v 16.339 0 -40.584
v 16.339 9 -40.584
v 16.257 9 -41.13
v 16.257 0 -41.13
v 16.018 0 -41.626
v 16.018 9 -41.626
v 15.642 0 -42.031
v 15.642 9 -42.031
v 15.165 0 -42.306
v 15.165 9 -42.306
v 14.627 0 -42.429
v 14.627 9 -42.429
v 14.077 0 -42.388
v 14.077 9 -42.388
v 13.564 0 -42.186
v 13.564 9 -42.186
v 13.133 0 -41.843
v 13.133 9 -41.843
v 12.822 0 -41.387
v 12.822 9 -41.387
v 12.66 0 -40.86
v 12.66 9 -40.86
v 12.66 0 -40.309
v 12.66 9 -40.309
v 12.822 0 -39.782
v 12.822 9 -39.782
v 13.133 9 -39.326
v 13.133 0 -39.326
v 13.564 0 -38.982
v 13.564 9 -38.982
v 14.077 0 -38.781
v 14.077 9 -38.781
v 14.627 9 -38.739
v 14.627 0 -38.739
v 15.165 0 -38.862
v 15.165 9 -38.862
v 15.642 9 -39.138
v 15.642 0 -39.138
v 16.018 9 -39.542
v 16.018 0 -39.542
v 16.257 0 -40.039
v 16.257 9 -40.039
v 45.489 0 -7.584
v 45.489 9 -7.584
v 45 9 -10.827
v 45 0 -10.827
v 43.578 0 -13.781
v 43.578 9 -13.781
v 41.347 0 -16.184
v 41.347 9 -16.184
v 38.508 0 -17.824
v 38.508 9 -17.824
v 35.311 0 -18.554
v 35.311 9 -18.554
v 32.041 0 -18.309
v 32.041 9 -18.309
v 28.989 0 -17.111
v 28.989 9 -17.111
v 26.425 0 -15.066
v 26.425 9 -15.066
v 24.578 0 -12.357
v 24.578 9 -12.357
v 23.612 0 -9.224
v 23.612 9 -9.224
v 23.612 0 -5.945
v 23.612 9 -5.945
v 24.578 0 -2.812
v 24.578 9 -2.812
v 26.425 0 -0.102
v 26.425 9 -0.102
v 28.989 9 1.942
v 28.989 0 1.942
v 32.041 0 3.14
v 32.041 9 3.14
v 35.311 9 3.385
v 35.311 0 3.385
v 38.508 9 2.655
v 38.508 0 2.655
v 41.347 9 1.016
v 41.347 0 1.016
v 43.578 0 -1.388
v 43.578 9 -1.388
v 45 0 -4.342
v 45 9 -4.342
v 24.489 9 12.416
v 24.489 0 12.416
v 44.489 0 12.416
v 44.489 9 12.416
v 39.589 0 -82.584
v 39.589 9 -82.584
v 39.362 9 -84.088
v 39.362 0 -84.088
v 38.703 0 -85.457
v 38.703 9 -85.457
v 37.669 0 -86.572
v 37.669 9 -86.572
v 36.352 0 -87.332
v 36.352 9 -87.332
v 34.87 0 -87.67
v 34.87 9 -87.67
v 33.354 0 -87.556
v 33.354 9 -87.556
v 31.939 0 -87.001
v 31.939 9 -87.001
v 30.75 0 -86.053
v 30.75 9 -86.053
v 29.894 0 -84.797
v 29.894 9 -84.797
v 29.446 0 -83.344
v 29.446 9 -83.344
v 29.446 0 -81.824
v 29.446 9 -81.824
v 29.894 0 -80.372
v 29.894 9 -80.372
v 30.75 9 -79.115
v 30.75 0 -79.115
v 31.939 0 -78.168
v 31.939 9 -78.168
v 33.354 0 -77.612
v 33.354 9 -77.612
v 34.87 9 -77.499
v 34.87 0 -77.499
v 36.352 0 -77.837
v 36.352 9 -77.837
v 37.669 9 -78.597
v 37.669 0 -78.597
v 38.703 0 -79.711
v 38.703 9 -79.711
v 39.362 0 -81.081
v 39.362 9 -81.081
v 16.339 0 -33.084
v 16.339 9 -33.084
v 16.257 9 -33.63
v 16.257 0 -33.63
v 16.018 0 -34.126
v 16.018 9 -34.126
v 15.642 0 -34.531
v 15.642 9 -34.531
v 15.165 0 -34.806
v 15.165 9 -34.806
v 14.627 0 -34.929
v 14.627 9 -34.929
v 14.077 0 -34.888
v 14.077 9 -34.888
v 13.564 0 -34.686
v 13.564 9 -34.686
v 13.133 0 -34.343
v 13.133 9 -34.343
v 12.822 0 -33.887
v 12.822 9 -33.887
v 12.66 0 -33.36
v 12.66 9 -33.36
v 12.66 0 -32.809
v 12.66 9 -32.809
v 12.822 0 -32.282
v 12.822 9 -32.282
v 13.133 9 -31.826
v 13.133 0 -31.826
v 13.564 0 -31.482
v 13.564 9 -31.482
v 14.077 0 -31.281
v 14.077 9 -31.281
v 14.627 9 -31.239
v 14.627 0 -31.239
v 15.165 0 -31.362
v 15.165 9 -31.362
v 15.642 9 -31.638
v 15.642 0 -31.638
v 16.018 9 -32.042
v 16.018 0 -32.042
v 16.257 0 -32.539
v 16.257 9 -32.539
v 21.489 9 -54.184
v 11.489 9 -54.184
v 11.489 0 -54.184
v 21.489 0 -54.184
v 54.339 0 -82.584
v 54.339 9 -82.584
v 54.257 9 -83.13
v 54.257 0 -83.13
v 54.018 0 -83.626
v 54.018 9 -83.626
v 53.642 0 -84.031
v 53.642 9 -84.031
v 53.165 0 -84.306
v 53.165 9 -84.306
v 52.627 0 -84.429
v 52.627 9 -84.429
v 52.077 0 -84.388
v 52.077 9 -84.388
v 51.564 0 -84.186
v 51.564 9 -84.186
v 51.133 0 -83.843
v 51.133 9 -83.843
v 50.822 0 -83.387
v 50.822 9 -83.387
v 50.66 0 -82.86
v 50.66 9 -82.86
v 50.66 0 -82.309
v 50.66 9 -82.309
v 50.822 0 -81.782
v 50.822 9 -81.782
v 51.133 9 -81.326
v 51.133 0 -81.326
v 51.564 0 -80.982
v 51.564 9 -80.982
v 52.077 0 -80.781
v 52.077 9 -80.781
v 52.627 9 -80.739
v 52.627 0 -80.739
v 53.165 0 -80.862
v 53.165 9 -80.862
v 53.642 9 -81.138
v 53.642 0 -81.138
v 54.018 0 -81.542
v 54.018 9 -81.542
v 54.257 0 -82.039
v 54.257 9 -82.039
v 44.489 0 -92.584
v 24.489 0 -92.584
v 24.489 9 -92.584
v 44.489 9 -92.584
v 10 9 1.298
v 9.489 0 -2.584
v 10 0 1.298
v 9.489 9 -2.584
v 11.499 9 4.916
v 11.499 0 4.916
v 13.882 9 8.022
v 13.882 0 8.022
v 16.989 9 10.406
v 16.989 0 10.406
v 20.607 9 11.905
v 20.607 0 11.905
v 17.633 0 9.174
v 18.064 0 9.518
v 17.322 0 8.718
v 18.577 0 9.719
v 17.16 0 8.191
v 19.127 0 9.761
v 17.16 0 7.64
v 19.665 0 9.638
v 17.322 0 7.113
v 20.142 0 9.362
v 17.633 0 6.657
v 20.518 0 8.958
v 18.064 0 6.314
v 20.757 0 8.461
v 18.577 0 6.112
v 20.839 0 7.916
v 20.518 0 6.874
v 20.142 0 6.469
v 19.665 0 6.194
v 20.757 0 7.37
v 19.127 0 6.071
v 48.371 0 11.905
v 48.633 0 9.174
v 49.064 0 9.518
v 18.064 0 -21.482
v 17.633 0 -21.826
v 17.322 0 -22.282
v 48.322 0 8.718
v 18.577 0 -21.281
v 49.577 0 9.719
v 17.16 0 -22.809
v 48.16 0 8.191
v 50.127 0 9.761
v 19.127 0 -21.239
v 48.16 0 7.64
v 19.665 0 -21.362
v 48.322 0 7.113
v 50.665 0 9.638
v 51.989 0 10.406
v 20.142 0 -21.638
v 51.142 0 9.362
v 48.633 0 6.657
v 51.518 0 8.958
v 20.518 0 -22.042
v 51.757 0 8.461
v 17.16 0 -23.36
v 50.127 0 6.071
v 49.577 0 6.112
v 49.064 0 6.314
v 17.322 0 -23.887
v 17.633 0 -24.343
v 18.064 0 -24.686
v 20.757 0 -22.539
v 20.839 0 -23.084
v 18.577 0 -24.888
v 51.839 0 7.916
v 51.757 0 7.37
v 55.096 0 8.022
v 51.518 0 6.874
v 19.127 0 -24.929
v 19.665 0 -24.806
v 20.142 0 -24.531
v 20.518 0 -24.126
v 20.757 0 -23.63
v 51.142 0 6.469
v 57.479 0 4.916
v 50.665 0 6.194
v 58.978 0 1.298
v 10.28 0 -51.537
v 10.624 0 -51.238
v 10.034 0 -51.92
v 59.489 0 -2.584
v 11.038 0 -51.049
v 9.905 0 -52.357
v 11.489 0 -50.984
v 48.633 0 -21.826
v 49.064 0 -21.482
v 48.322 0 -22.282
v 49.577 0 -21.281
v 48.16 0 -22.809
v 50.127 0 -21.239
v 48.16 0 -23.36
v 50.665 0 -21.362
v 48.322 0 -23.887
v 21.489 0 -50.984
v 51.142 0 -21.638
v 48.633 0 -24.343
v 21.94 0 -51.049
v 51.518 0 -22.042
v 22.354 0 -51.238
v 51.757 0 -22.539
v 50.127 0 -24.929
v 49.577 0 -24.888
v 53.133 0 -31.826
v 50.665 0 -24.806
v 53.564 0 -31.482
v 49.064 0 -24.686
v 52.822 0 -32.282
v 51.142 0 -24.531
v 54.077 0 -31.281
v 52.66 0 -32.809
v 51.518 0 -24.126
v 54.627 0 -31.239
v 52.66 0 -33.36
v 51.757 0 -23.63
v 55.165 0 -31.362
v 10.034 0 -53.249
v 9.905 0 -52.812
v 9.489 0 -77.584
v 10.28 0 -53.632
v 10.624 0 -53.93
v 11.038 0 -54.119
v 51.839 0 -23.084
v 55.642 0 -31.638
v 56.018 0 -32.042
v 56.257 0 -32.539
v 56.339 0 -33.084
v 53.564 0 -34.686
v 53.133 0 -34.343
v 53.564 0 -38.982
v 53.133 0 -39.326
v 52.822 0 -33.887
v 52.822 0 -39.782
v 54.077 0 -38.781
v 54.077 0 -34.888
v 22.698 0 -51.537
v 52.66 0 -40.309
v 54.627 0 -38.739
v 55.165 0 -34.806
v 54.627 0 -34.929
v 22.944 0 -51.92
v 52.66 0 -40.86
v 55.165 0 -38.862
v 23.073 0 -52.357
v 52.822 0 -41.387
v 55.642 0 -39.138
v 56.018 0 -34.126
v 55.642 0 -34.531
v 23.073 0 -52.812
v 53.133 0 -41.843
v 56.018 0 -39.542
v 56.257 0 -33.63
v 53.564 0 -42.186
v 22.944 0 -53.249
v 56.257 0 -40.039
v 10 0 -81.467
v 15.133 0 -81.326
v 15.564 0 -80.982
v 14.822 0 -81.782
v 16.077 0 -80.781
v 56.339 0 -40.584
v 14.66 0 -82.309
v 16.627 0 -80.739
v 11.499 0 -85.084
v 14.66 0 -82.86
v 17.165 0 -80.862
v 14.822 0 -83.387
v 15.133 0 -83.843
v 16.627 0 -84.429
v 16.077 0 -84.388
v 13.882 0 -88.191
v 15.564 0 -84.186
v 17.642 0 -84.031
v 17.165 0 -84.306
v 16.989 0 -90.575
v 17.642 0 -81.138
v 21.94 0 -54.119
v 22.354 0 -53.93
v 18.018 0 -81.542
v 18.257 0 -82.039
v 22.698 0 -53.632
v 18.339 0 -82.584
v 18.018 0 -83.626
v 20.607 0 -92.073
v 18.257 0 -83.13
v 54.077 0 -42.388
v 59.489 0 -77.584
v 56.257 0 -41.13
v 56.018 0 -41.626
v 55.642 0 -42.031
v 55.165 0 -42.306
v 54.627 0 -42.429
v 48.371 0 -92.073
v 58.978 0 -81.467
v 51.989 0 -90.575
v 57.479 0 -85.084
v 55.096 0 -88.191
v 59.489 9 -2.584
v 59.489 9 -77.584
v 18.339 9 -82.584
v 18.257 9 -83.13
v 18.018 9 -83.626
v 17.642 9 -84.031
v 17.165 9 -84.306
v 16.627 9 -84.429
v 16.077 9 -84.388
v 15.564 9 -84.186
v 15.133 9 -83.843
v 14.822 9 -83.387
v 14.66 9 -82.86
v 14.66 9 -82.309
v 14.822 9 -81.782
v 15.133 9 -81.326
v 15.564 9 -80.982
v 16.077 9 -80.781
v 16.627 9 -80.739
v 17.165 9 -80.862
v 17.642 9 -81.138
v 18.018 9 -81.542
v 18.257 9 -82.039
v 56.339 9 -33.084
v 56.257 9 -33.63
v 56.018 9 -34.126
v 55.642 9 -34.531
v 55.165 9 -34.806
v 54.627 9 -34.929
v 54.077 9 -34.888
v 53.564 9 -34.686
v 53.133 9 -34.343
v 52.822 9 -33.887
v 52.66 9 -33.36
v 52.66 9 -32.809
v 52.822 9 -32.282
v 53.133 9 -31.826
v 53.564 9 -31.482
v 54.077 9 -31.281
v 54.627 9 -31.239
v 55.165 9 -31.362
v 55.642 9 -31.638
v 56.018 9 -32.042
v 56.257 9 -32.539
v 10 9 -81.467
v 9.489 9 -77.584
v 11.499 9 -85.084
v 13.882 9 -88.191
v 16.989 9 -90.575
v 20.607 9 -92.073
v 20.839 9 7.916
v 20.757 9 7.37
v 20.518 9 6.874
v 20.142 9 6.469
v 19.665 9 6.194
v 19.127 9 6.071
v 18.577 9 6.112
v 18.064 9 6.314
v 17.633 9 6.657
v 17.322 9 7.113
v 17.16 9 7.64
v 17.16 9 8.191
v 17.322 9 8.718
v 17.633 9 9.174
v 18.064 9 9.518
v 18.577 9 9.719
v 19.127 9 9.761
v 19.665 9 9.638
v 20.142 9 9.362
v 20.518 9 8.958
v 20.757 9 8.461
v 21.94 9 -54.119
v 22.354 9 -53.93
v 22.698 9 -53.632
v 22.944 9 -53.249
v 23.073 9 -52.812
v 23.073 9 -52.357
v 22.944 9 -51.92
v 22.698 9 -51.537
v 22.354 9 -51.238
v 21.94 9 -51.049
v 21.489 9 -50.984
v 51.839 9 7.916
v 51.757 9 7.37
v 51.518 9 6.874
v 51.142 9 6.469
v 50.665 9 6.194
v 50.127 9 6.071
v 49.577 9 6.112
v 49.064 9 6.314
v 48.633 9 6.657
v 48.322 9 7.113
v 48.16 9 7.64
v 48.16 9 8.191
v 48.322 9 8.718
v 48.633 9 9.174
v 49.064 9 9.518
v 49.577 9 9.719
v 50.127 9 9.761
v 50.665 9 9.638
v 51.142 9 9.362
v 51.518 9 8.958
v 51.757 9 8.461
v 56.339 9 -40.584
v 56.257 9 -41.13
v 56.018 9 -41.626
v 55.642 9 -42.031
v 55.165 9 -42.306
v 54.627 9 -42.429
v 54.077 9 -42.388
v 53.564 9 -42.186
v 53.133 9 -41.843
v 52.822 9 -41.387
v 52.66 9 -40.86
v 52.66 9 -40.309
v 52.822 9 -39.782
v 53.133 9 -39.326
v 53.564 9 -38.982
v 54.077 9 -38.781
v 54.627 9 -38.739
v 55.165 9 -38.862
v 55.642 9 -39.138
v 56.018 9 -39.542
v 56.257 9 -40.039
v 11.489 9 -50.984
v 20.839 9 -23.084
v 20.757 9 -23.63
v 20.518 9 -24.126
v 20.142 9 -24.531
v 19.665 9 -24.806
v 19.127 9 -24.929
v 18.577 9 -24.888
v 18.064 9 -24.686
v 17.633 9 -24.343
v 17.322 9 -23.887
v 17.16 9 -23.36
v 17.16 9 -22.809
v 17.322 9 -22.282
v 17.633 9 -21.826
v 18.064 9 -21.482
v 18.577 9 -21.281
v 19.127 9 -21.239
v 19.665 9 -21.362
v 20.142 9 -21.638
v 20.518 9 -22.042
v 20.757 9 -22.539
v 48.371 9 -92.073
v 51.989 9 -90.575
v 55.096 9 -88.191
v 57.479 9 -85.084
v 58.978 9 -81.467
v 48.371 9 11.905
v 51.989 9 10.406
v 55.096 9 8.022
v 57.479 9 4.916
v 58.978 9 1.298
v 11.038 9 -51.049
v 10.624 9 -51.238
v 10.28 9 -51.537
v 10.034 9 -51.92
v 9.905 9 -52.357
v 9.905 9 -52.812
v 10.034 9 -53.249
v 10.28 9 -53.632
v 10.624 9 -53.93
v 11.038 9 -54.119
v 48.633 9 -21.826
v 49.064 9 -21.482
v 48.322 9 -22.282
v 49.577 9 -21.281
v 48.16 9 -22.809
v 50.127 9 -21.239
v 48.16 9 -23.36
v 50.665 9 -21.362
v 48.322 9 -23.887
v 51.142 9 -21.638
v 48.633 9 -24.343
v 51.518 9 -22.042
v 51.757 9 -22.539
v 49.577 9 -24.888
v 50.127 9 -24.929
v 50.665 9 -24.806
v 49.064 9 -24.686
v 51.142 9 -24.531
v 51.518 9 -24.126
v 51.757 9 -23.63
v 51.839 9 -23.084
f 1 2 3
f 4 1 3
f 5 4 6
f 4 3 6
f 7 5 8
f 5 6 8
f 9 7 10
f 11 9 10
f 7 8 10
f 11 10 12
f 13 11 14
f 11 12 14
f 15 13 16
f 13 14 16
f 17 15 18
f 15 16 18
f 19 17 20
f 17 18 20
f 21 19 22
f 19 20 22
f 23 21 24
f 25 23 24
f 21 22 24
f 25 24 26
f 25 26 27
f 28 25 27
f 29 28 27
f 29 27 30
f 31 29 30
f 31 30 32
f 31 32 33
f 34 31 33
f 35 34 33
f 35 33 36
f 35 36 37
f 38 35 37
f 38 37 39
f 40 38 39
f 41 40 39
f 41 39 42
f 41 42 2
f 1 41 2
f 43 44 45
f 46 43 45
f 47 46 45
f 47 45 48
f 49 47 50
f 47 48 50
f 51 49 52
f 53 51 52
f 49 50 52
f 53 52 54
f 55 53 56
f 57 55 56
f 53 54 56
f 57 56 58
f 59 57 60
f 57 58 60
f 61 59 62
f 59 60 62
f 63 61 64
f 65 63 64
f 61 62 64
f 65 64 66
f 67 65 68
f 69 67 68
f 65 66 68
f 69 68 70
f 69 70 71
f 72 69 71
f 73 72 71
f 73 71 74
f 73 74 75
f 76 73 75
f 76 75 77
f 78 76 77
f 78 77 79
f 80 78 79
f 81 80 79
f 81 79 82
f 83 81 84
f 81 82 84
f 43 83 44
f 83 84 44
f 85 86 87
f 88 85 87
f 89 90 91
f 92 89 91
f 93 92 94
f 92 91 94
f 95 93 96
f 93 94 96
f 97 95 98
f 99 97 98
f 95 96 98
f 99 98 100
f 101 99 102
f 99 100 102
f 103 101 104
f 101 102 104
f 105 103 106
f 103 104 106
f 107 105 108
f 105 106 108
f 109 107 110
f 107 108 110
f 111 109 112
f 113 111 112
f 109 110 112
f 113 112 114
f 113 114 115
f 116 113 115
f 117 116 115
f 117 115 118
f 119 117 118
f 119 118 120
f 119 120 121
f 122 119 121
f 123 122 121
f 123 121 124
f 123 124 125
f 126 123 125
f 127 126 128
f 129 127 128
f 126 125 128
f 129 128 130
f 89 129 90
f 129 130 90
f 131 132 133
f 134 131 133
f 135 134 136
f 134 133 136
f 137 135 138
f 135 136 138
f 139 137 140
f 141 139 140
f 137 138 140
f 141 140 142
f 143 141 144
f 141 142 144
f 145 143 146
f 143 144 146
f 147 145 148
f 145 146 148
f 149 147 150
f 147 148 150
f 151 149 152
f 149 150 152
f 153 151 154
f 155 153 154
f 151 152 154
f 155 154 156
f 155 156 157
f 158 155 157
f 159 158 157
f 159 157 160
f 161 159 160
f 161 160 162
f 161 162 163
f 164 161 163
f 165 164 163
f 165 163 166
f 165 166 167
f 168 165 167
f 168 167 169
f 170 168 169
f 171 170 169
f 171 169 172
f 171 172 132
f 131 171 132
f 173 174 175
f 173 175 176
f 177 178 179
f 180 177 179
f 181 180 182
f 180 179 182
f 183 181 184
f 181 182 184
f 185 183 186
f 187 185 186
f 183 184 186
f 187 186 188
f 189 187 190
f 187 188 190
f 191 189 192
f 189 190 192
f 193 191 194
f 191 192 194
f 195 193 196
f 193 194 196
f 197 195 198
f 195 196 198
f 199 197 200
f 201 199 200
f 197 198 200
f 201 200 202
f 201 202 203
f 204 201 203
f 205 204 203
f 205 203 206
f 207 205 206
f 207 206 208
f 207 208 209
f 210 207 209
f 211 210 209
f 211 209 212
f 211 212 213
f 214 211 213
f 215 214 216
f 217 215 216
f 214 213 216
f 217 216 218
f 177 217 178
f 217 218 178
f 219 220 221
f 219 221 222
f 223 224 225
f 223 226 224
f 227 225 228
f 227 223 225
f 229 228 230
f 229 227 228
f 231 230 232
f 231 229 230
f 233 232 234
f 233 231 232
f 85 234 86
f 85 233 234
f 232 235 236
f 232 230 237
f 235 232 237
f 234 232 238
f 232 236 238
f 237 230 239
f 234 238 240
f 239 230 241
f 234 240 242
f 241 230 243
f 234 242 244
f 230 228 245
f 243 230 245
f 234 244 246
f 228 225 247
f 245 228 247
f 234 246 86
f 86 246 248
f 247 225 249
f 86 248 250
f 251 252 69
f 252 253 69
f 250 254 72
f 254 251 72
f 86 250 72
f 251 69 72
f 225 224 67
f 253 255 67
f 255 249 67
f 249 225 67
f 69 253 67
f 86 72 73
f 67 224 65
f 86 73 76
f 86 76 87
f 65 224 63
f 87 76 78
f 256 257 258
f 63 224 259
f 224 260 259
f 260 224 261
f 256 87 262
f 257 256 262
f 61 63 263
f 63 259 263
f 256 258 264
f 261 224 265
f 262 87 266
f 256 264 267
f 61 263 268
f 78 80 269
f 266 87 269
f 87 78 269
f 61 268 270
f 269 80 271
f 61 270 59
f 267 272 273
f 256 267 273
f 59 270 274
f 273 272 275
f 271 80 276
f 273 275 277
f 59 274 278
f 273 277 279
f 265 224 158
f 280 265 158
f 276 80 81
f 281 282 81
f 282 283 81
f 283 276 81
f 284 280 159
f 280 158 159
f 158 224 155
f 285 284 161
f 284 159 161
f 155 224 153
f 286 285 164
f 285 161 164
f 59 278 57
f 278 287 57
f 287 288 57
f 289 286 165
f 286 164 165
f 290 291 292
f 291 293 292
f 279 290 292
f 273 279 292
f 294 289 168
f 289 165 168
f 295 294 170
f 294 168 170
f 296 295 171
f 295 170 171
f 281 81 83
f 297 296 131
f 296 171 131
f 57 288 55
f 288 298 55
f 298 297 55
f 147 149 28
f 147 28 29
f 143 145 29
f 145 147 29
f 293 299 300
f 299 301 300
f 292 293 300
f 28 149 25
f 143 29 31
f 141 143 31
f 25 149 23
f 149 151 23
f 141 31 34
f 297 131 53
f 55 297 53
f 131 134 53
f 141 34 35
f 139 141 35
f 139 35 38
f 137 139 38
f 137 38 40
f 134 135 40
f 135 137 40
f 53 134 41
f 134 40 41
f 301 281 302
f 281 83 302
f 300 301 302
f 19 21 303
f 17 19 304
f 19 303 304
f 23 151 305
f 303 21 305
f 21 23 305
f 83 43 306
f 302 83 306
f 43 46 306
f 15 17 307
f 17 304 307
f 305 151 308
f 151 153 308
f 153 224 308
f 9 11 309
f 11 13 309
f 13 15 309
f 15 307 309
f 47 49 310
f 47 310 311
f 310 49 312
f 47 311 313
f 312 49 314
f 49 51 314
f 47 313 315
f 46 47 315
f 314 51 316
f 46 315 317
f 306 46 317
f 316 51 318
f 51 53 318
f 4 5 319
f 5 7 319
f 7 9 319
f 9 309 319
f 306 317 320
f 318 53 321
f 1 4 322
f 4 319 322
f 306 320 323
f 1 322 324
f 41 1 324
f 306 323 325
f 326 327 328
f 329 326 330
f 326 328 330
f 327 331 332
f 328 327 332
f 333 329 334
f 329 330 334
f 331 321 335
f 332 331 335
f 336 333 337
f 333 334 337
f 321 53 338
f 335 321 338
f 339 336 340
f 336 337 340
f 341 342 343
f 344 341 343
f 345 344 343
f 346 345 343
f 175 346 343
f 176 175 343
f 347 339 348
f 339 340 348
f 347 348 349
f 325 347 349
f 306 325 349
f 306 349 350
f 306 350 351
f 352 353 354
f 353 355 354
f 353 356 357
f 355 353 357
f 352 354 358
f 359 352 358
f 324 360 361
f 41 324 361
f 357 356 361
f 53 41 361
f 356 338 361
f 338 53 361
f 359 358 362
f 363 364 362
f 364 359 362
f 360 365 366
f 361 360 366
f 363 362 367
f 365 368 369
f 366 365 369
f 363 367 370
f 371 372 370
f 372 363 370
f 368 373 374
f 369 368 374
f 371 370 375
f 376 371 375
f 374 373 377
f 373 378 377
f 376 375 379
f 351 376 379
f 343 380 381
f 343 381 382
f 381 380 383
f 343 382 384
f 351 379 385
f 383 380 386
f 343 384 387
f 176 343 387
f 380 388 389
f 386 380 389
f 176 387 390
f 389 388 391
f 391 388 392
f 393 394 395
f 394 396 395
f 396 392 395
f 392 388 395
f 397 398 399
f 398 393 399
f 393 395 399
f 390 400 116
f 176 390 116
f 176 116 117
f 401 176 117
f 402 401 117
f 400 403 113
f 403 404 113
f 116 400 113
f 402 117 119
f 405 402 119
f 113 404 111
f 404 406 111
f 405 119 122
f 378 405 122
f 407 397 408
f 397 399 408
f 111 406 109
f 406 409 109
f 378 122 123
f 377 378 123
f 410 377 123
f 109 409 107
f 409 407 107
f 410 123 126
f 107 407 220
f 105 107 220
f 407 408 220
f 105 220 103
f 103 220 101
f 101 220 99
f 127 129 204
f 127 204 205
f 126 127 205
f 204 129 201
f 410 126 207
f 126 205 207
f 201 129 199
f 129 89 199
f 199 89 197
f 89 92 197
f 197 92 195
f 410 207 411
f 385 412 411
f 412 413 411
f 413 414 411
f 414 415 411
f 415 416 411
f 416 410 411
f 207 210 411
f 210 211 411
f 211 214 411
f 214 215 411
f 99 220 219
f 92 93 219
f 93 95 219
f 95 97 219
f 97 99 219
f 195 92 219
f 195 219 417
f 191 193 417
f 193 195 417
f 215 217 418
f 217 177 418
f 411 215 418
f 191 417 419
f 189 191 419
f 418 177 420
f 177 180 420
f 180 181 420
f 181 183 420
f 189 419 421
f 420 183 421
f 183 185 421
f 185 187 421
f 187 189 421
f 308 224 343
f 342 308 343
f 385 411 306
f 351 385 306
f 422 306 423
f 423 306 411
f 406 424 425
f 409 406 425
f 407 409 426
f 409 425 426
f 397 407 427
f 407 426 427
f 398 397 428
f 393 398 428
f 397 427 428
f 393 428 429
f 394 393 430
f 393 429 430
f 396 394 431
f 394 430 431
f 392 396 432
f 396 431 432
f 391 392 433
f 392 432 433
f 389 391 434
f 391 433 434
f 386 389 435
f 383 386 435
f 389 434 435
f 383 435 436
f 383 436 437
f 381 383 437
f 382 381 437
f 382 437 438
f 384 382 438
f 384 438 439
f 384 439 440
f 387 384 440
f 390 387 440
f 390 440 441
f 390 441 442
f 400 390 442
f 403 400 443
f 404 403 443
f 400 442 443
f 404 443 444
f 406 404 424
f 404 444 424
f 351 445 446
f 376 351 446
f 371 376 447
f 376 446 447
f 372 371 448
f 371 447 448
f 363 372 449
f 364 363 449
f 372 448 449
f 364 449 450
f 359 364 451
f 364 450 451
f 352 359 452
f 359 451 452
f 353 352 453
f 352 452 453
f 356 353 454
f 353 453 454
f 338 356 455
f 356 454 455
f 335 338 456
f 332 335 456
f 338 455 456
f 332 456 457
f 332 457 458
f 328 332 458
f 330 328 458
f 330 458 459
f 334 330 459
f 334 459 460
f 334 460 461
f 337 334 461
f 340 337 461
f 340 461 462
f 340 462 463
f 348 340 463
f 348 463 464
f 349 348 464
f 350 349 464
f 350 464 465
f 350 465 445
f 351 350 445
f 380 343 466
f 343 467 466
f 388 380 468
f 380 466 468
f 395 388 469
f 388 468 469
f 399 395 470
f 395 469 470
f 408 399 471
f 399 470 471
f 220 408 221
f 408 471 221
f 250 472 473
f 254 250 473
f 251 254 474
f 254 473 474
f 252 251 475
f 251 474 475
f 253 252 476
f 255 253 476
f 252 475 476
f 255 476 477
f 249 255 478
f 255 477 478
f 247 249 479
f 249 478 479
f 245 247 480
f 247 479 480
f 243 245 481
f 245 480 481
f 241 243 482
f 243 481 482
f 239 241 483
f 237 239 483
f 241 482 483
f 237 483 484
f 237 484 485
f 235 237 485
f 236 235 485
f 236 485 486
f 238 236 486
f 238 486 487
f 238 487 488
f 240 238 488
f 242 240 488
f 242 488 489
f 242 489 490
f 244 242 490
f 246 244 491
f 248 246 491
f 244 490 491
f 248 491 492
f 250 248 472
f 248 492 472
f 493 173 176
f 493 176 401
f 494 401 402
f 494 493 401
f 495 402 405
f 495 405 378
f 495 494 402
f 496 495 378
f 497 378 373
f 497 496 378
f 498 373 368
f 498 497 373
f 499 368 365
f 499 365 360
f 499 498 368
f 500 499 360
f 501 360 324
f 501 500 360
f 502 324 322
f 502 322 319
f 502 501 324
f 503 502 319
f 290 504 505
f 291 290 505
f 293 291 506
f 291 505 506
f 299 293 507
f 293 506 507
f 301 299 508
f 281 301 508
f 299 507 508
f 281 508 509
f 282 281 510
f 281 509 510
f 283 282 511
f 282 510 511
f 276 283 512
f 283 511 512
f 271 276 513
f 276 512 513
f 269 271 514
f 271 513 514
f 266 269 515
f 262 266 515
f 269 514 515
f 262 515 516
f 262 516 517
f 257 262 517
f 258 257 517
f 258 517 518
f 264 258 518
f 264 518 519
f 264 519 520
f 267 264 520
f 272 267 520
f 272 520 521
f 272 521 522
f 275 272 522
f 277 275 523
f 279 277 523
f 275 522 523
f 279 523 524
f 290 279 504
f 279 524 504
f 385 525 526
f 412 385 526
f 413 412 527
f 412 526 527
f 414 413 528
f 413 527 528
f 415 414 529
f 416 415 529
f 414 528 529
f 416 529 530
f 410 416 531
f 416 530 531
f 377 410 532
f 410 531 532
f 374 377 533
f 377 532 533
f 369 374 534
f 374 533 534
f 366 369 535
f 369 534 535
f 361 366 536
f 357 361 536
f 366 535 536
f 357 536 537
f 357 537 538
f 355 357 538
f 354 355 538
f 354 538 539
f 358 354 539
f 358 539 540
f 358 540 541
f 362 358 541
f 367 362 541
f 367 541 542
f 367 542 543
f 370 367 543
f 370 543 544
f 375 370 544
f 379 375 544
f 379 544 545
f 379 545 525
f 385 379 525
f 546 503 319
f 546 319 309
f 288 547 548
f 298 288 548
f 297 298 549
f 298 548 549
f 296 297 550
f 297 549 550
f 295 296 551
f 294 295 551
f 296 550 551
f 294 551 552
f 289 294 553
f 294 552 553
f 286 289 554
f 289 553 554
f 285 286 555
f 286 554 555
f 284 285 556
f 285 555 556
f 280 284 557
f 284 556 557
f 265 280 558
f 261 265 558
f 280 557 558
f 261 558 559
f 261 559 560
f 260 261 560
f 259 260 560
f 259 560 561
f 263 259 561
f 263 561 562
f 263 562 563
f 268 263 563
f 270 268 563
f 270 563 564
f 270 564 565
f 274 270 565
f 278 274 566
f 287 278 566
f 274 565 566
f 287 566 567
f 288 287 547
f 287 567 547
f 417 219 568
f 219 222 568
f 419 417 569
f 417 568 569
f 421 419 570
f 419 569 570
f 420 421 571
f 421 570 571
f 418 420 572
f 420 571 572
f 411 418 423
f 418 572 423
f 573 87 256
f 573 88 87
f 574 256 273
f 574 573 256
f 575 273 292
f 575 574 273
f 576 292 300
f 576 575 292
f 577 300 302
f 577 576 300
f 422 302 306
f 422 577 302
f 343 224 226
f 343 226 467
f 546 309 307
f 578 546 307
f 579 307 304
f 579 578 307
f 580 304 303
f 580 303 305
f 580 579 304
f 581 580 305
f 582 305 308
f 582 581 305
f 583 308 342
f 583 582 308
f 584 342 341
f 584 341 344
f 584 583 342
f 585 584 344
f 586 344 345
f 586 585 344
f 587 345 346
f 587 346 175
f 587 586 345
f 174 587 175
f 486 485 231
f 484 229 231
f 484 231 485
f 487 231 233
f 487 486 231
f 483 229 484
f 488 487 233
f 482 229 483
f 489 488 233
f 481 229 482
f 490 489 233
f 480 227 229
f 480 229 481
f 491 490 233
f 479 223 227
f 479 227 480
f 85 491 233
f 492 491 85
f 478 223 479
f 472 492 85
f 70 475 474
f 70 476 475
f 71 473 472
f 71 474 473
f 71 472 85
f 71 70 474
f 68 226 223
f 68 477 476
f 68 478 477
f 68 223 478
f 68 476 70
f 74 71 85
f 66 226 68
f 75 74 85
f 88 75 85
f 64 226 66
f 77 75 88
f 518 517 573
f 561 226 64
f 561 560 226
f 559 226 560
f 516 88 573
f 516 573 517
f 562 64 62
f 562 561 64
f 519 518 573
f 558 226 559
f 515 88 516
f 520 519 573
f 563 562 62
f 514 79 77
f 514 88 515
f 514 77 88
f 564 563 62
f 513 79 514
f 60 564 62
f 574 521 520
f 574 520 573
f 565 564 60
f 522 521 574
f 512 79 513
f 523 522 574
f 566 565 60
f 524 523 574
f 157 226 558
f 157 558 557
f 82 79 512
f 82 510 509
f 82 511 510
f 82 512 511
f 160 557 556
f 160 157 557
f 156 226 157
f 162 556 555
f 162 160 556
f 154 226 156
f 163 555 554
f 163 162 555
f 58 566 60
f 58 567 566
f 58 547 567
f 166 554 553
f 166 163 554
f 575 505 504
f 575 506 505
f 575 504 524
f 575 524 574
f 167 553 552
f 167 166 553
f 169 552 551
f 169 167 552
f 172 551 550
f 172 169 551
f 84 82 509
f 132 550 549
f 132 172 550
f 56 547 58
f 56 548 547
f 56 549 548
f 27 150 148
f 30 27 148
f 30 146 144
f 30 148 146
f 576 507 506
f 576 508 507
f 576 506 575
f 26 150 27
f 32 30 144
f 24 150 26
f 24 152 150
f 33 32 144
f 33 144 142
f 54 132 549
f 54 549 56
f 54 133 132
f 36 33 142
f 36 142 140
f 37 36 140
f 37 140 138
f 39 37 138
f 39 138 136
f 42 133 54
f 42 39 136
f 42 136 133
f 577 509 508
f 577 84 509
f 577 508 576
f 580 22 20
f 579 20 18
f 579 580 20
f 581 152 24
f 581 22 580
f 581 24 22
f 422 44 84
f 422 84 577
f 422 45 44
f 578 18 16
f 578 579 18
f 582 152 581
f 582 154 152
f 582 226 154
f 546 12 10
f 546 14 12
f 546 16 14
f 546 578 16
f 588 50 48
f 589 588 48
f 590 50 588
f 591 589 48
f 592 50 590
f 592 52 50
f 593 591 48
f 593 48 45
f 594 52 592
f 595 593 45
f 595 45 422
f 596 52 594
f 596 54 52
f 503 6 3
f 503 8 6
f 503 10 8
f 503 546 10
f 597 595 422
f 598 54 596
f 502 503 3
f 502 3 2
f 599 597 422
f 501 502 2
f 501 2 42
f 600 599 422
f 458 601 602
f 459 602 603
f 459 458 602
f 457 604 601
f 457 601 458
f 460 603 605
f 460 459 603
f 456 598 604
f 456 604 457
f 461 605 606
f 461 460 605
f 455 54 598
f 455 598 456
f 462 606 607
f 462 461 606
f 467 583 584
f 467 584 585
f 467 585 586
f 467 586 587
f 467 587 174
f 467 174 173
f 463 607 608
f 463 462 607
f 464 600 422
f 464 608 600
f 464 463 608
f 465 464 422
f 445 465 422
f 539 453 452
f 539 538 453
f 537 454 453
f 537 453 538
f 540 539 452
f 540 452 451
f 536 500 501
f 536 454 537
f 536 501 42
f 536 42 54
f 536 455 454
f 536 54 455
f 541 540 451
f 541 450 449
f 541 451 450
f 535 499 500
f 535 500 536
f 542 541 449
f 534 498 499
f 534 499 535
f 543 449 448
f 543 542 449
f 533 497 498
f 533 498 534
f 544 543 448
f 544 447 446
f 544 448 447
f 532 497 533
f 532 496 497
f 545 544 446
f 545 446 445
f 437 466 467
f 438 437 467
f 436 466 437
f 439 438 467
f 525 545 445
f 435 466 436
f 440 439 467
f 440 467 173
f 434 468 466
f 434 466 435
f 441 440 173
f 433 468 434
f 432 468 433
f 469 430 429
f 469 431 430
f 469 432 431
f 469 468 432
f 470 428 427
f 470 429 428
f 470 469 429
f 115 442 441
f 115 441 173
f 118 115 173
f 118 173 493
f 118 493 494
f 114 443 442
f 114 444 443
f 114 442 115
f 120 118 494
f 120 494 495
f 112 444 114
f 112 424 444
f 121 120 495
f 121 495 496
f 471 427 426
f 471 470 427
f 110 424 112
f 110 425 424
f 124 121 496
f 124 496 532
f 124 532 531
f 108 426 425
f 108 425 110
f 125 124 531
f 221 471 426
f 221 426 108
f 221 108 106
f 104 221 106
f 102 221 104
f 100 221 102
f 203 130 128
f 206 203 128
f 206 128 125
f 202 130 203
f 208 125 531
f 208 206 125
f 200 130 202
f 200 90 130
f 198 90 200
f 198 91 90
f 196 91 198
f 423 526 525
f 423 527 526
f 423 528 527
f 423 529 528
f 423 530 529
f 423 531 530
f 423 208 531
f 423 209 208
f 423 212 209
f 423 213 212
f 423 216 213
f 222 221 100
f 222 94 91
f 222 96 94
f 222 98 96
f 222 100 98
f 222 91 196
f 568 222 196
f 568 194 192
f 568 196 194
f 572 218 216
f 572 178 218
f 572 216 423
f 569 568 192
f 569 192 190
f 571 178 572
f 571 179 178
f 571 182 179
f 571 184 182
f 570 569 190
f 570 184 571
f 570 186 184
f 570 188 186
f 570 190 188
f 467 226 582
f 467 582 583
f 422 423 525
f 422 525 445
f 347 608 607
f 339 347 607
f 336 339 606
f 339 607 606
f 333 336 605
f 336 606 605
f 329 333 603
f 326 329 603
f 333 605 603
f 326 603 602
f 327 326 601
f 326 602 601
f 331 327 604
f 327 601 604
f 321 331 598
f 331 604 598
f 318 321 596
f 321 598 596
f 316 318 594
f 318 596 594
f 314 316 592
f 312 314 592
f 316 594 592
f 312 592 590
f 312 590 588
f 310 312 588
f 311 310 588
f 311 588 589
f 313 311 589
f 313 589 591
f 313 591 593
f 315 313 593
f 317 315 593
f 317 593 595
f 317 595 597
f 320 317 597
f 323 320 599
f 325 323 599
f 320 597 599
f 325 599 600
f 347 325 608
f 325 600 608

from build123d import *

# Parameters (mm, degrees)
SKETCH1_W           = 50
SKETCH1_H           = 105
BOSS_EXTRUDE1_DEPTH = 9
SKETCH2_R           = 11
SKETCH2_R_2         = 1.85
SKETCH2_R_3         = 5.1
CUT_EXTRUDE1_DEPTH  = 9
SKETCH3_R           = 1.85
CUT_EXTRUDE4_DEPTH  = 10
FILLET1_R           = 15


with BuildPart() as part:
    # Sketch1 → Boss-Extrude1 (new body)
    with BuildSketch(Plane(origin=(0, 0, 0), x_dir=(1, 0, 0), z_dir=(0, 1, 0))):
        with Locations((34.488967371, 40.084311239)):
            Rectangle(SKETCH1_W, SKETCH1_H)
    extrude(amount=BOSS_EXTRUDE1_DEPTH)

    # Sketch2 → Cut-Extrude1 (cut)
    with BuildSketch(Plane(origin=(0, 9, 0), x_dir=(1, 0, 0), z_dir=(0, 1, 0))):
        with Locations((34.488967371, 7.584311239)):
            Circle(SKETCH2_R)
        with Locations((49.988967371, 23.084311239)):
            Circle(SKETCH2_R_2)
        with Locations((18.988967371, -7.915688761)):
            Circle(SKETCH2_R_2)
        with Locations((49.988967371, -7.915688761)):
            Circle(SKETCH2_R_2)
        with Locations((18.988967371, 23.084311239)):
            Circle(SKETCH2_R_2)
        with Locations((52.488967371, 82.584311239)):
            Circle(SKETCH2_R_2)
        with Locations((34.488967371, 82.584311239)):
            Circle(SKETCH2_R_3)
        with Locations((16.488967371, 82.584311239)):
            Circle(SKETCH2_R_2)
        with BuildLine():
            Line((21.488967371, 50.984311239), (11.488967371, 50.984311239))
            ThreePointArc((11.488967371, 50.984311239), (9.888967371, 52.584311239), (11.488967371, 54.184311239))
            Line((11.488967371, 54.184311239), (21.488967371, 54.184311239))
            ThreePointArc((21.488967371, 54.184311239), (23.088967371, 52.584311239), (21.488967371, 50.984311239))
        make_face()
    extrude(amount=-CUT_EXTRUDE1_DEPTH, mode=Mode.SUBTRACT)

    # Sketch3 → Cut-Extrude4 (cut)
    with BuildSketch(Plane(origin=(0, 9, 0), x_dir=(1, 0, 0), z_dir=(0, 1, 0))):
        with Locations((14.488967371, 40.584311239)):
            Circle(SKETCH3_R)
        with Locations((54.488967371, 40.584311239)):
            Circle(SKETCH3_R)
        with Locations((54.488967371, 33.084311239)):
            Circle(SKETCH3_R)
        with Locations((14.488967371, 33.084311239)):
            Circle(SKETCH3_R)
    extrude(amount=-CUT_EXTRUDE4_DEPTH, mode=Mode.SUBTRACT)

    # Fillet1
    fillet1_edges = [part.edges().sort_by_distance(p)[0] for p in [
        (9.488967371, 4.5, -92.584311239),
        (59.488967371, 4.5, -92.584311239),
        (59.488967371, 4.5, 12.415688761),
        (9.488967371, 4.5, 12.415688761),
    ]]
    fillet(fillet1_edges, radius=FILLET1_R)


solid = part.part
